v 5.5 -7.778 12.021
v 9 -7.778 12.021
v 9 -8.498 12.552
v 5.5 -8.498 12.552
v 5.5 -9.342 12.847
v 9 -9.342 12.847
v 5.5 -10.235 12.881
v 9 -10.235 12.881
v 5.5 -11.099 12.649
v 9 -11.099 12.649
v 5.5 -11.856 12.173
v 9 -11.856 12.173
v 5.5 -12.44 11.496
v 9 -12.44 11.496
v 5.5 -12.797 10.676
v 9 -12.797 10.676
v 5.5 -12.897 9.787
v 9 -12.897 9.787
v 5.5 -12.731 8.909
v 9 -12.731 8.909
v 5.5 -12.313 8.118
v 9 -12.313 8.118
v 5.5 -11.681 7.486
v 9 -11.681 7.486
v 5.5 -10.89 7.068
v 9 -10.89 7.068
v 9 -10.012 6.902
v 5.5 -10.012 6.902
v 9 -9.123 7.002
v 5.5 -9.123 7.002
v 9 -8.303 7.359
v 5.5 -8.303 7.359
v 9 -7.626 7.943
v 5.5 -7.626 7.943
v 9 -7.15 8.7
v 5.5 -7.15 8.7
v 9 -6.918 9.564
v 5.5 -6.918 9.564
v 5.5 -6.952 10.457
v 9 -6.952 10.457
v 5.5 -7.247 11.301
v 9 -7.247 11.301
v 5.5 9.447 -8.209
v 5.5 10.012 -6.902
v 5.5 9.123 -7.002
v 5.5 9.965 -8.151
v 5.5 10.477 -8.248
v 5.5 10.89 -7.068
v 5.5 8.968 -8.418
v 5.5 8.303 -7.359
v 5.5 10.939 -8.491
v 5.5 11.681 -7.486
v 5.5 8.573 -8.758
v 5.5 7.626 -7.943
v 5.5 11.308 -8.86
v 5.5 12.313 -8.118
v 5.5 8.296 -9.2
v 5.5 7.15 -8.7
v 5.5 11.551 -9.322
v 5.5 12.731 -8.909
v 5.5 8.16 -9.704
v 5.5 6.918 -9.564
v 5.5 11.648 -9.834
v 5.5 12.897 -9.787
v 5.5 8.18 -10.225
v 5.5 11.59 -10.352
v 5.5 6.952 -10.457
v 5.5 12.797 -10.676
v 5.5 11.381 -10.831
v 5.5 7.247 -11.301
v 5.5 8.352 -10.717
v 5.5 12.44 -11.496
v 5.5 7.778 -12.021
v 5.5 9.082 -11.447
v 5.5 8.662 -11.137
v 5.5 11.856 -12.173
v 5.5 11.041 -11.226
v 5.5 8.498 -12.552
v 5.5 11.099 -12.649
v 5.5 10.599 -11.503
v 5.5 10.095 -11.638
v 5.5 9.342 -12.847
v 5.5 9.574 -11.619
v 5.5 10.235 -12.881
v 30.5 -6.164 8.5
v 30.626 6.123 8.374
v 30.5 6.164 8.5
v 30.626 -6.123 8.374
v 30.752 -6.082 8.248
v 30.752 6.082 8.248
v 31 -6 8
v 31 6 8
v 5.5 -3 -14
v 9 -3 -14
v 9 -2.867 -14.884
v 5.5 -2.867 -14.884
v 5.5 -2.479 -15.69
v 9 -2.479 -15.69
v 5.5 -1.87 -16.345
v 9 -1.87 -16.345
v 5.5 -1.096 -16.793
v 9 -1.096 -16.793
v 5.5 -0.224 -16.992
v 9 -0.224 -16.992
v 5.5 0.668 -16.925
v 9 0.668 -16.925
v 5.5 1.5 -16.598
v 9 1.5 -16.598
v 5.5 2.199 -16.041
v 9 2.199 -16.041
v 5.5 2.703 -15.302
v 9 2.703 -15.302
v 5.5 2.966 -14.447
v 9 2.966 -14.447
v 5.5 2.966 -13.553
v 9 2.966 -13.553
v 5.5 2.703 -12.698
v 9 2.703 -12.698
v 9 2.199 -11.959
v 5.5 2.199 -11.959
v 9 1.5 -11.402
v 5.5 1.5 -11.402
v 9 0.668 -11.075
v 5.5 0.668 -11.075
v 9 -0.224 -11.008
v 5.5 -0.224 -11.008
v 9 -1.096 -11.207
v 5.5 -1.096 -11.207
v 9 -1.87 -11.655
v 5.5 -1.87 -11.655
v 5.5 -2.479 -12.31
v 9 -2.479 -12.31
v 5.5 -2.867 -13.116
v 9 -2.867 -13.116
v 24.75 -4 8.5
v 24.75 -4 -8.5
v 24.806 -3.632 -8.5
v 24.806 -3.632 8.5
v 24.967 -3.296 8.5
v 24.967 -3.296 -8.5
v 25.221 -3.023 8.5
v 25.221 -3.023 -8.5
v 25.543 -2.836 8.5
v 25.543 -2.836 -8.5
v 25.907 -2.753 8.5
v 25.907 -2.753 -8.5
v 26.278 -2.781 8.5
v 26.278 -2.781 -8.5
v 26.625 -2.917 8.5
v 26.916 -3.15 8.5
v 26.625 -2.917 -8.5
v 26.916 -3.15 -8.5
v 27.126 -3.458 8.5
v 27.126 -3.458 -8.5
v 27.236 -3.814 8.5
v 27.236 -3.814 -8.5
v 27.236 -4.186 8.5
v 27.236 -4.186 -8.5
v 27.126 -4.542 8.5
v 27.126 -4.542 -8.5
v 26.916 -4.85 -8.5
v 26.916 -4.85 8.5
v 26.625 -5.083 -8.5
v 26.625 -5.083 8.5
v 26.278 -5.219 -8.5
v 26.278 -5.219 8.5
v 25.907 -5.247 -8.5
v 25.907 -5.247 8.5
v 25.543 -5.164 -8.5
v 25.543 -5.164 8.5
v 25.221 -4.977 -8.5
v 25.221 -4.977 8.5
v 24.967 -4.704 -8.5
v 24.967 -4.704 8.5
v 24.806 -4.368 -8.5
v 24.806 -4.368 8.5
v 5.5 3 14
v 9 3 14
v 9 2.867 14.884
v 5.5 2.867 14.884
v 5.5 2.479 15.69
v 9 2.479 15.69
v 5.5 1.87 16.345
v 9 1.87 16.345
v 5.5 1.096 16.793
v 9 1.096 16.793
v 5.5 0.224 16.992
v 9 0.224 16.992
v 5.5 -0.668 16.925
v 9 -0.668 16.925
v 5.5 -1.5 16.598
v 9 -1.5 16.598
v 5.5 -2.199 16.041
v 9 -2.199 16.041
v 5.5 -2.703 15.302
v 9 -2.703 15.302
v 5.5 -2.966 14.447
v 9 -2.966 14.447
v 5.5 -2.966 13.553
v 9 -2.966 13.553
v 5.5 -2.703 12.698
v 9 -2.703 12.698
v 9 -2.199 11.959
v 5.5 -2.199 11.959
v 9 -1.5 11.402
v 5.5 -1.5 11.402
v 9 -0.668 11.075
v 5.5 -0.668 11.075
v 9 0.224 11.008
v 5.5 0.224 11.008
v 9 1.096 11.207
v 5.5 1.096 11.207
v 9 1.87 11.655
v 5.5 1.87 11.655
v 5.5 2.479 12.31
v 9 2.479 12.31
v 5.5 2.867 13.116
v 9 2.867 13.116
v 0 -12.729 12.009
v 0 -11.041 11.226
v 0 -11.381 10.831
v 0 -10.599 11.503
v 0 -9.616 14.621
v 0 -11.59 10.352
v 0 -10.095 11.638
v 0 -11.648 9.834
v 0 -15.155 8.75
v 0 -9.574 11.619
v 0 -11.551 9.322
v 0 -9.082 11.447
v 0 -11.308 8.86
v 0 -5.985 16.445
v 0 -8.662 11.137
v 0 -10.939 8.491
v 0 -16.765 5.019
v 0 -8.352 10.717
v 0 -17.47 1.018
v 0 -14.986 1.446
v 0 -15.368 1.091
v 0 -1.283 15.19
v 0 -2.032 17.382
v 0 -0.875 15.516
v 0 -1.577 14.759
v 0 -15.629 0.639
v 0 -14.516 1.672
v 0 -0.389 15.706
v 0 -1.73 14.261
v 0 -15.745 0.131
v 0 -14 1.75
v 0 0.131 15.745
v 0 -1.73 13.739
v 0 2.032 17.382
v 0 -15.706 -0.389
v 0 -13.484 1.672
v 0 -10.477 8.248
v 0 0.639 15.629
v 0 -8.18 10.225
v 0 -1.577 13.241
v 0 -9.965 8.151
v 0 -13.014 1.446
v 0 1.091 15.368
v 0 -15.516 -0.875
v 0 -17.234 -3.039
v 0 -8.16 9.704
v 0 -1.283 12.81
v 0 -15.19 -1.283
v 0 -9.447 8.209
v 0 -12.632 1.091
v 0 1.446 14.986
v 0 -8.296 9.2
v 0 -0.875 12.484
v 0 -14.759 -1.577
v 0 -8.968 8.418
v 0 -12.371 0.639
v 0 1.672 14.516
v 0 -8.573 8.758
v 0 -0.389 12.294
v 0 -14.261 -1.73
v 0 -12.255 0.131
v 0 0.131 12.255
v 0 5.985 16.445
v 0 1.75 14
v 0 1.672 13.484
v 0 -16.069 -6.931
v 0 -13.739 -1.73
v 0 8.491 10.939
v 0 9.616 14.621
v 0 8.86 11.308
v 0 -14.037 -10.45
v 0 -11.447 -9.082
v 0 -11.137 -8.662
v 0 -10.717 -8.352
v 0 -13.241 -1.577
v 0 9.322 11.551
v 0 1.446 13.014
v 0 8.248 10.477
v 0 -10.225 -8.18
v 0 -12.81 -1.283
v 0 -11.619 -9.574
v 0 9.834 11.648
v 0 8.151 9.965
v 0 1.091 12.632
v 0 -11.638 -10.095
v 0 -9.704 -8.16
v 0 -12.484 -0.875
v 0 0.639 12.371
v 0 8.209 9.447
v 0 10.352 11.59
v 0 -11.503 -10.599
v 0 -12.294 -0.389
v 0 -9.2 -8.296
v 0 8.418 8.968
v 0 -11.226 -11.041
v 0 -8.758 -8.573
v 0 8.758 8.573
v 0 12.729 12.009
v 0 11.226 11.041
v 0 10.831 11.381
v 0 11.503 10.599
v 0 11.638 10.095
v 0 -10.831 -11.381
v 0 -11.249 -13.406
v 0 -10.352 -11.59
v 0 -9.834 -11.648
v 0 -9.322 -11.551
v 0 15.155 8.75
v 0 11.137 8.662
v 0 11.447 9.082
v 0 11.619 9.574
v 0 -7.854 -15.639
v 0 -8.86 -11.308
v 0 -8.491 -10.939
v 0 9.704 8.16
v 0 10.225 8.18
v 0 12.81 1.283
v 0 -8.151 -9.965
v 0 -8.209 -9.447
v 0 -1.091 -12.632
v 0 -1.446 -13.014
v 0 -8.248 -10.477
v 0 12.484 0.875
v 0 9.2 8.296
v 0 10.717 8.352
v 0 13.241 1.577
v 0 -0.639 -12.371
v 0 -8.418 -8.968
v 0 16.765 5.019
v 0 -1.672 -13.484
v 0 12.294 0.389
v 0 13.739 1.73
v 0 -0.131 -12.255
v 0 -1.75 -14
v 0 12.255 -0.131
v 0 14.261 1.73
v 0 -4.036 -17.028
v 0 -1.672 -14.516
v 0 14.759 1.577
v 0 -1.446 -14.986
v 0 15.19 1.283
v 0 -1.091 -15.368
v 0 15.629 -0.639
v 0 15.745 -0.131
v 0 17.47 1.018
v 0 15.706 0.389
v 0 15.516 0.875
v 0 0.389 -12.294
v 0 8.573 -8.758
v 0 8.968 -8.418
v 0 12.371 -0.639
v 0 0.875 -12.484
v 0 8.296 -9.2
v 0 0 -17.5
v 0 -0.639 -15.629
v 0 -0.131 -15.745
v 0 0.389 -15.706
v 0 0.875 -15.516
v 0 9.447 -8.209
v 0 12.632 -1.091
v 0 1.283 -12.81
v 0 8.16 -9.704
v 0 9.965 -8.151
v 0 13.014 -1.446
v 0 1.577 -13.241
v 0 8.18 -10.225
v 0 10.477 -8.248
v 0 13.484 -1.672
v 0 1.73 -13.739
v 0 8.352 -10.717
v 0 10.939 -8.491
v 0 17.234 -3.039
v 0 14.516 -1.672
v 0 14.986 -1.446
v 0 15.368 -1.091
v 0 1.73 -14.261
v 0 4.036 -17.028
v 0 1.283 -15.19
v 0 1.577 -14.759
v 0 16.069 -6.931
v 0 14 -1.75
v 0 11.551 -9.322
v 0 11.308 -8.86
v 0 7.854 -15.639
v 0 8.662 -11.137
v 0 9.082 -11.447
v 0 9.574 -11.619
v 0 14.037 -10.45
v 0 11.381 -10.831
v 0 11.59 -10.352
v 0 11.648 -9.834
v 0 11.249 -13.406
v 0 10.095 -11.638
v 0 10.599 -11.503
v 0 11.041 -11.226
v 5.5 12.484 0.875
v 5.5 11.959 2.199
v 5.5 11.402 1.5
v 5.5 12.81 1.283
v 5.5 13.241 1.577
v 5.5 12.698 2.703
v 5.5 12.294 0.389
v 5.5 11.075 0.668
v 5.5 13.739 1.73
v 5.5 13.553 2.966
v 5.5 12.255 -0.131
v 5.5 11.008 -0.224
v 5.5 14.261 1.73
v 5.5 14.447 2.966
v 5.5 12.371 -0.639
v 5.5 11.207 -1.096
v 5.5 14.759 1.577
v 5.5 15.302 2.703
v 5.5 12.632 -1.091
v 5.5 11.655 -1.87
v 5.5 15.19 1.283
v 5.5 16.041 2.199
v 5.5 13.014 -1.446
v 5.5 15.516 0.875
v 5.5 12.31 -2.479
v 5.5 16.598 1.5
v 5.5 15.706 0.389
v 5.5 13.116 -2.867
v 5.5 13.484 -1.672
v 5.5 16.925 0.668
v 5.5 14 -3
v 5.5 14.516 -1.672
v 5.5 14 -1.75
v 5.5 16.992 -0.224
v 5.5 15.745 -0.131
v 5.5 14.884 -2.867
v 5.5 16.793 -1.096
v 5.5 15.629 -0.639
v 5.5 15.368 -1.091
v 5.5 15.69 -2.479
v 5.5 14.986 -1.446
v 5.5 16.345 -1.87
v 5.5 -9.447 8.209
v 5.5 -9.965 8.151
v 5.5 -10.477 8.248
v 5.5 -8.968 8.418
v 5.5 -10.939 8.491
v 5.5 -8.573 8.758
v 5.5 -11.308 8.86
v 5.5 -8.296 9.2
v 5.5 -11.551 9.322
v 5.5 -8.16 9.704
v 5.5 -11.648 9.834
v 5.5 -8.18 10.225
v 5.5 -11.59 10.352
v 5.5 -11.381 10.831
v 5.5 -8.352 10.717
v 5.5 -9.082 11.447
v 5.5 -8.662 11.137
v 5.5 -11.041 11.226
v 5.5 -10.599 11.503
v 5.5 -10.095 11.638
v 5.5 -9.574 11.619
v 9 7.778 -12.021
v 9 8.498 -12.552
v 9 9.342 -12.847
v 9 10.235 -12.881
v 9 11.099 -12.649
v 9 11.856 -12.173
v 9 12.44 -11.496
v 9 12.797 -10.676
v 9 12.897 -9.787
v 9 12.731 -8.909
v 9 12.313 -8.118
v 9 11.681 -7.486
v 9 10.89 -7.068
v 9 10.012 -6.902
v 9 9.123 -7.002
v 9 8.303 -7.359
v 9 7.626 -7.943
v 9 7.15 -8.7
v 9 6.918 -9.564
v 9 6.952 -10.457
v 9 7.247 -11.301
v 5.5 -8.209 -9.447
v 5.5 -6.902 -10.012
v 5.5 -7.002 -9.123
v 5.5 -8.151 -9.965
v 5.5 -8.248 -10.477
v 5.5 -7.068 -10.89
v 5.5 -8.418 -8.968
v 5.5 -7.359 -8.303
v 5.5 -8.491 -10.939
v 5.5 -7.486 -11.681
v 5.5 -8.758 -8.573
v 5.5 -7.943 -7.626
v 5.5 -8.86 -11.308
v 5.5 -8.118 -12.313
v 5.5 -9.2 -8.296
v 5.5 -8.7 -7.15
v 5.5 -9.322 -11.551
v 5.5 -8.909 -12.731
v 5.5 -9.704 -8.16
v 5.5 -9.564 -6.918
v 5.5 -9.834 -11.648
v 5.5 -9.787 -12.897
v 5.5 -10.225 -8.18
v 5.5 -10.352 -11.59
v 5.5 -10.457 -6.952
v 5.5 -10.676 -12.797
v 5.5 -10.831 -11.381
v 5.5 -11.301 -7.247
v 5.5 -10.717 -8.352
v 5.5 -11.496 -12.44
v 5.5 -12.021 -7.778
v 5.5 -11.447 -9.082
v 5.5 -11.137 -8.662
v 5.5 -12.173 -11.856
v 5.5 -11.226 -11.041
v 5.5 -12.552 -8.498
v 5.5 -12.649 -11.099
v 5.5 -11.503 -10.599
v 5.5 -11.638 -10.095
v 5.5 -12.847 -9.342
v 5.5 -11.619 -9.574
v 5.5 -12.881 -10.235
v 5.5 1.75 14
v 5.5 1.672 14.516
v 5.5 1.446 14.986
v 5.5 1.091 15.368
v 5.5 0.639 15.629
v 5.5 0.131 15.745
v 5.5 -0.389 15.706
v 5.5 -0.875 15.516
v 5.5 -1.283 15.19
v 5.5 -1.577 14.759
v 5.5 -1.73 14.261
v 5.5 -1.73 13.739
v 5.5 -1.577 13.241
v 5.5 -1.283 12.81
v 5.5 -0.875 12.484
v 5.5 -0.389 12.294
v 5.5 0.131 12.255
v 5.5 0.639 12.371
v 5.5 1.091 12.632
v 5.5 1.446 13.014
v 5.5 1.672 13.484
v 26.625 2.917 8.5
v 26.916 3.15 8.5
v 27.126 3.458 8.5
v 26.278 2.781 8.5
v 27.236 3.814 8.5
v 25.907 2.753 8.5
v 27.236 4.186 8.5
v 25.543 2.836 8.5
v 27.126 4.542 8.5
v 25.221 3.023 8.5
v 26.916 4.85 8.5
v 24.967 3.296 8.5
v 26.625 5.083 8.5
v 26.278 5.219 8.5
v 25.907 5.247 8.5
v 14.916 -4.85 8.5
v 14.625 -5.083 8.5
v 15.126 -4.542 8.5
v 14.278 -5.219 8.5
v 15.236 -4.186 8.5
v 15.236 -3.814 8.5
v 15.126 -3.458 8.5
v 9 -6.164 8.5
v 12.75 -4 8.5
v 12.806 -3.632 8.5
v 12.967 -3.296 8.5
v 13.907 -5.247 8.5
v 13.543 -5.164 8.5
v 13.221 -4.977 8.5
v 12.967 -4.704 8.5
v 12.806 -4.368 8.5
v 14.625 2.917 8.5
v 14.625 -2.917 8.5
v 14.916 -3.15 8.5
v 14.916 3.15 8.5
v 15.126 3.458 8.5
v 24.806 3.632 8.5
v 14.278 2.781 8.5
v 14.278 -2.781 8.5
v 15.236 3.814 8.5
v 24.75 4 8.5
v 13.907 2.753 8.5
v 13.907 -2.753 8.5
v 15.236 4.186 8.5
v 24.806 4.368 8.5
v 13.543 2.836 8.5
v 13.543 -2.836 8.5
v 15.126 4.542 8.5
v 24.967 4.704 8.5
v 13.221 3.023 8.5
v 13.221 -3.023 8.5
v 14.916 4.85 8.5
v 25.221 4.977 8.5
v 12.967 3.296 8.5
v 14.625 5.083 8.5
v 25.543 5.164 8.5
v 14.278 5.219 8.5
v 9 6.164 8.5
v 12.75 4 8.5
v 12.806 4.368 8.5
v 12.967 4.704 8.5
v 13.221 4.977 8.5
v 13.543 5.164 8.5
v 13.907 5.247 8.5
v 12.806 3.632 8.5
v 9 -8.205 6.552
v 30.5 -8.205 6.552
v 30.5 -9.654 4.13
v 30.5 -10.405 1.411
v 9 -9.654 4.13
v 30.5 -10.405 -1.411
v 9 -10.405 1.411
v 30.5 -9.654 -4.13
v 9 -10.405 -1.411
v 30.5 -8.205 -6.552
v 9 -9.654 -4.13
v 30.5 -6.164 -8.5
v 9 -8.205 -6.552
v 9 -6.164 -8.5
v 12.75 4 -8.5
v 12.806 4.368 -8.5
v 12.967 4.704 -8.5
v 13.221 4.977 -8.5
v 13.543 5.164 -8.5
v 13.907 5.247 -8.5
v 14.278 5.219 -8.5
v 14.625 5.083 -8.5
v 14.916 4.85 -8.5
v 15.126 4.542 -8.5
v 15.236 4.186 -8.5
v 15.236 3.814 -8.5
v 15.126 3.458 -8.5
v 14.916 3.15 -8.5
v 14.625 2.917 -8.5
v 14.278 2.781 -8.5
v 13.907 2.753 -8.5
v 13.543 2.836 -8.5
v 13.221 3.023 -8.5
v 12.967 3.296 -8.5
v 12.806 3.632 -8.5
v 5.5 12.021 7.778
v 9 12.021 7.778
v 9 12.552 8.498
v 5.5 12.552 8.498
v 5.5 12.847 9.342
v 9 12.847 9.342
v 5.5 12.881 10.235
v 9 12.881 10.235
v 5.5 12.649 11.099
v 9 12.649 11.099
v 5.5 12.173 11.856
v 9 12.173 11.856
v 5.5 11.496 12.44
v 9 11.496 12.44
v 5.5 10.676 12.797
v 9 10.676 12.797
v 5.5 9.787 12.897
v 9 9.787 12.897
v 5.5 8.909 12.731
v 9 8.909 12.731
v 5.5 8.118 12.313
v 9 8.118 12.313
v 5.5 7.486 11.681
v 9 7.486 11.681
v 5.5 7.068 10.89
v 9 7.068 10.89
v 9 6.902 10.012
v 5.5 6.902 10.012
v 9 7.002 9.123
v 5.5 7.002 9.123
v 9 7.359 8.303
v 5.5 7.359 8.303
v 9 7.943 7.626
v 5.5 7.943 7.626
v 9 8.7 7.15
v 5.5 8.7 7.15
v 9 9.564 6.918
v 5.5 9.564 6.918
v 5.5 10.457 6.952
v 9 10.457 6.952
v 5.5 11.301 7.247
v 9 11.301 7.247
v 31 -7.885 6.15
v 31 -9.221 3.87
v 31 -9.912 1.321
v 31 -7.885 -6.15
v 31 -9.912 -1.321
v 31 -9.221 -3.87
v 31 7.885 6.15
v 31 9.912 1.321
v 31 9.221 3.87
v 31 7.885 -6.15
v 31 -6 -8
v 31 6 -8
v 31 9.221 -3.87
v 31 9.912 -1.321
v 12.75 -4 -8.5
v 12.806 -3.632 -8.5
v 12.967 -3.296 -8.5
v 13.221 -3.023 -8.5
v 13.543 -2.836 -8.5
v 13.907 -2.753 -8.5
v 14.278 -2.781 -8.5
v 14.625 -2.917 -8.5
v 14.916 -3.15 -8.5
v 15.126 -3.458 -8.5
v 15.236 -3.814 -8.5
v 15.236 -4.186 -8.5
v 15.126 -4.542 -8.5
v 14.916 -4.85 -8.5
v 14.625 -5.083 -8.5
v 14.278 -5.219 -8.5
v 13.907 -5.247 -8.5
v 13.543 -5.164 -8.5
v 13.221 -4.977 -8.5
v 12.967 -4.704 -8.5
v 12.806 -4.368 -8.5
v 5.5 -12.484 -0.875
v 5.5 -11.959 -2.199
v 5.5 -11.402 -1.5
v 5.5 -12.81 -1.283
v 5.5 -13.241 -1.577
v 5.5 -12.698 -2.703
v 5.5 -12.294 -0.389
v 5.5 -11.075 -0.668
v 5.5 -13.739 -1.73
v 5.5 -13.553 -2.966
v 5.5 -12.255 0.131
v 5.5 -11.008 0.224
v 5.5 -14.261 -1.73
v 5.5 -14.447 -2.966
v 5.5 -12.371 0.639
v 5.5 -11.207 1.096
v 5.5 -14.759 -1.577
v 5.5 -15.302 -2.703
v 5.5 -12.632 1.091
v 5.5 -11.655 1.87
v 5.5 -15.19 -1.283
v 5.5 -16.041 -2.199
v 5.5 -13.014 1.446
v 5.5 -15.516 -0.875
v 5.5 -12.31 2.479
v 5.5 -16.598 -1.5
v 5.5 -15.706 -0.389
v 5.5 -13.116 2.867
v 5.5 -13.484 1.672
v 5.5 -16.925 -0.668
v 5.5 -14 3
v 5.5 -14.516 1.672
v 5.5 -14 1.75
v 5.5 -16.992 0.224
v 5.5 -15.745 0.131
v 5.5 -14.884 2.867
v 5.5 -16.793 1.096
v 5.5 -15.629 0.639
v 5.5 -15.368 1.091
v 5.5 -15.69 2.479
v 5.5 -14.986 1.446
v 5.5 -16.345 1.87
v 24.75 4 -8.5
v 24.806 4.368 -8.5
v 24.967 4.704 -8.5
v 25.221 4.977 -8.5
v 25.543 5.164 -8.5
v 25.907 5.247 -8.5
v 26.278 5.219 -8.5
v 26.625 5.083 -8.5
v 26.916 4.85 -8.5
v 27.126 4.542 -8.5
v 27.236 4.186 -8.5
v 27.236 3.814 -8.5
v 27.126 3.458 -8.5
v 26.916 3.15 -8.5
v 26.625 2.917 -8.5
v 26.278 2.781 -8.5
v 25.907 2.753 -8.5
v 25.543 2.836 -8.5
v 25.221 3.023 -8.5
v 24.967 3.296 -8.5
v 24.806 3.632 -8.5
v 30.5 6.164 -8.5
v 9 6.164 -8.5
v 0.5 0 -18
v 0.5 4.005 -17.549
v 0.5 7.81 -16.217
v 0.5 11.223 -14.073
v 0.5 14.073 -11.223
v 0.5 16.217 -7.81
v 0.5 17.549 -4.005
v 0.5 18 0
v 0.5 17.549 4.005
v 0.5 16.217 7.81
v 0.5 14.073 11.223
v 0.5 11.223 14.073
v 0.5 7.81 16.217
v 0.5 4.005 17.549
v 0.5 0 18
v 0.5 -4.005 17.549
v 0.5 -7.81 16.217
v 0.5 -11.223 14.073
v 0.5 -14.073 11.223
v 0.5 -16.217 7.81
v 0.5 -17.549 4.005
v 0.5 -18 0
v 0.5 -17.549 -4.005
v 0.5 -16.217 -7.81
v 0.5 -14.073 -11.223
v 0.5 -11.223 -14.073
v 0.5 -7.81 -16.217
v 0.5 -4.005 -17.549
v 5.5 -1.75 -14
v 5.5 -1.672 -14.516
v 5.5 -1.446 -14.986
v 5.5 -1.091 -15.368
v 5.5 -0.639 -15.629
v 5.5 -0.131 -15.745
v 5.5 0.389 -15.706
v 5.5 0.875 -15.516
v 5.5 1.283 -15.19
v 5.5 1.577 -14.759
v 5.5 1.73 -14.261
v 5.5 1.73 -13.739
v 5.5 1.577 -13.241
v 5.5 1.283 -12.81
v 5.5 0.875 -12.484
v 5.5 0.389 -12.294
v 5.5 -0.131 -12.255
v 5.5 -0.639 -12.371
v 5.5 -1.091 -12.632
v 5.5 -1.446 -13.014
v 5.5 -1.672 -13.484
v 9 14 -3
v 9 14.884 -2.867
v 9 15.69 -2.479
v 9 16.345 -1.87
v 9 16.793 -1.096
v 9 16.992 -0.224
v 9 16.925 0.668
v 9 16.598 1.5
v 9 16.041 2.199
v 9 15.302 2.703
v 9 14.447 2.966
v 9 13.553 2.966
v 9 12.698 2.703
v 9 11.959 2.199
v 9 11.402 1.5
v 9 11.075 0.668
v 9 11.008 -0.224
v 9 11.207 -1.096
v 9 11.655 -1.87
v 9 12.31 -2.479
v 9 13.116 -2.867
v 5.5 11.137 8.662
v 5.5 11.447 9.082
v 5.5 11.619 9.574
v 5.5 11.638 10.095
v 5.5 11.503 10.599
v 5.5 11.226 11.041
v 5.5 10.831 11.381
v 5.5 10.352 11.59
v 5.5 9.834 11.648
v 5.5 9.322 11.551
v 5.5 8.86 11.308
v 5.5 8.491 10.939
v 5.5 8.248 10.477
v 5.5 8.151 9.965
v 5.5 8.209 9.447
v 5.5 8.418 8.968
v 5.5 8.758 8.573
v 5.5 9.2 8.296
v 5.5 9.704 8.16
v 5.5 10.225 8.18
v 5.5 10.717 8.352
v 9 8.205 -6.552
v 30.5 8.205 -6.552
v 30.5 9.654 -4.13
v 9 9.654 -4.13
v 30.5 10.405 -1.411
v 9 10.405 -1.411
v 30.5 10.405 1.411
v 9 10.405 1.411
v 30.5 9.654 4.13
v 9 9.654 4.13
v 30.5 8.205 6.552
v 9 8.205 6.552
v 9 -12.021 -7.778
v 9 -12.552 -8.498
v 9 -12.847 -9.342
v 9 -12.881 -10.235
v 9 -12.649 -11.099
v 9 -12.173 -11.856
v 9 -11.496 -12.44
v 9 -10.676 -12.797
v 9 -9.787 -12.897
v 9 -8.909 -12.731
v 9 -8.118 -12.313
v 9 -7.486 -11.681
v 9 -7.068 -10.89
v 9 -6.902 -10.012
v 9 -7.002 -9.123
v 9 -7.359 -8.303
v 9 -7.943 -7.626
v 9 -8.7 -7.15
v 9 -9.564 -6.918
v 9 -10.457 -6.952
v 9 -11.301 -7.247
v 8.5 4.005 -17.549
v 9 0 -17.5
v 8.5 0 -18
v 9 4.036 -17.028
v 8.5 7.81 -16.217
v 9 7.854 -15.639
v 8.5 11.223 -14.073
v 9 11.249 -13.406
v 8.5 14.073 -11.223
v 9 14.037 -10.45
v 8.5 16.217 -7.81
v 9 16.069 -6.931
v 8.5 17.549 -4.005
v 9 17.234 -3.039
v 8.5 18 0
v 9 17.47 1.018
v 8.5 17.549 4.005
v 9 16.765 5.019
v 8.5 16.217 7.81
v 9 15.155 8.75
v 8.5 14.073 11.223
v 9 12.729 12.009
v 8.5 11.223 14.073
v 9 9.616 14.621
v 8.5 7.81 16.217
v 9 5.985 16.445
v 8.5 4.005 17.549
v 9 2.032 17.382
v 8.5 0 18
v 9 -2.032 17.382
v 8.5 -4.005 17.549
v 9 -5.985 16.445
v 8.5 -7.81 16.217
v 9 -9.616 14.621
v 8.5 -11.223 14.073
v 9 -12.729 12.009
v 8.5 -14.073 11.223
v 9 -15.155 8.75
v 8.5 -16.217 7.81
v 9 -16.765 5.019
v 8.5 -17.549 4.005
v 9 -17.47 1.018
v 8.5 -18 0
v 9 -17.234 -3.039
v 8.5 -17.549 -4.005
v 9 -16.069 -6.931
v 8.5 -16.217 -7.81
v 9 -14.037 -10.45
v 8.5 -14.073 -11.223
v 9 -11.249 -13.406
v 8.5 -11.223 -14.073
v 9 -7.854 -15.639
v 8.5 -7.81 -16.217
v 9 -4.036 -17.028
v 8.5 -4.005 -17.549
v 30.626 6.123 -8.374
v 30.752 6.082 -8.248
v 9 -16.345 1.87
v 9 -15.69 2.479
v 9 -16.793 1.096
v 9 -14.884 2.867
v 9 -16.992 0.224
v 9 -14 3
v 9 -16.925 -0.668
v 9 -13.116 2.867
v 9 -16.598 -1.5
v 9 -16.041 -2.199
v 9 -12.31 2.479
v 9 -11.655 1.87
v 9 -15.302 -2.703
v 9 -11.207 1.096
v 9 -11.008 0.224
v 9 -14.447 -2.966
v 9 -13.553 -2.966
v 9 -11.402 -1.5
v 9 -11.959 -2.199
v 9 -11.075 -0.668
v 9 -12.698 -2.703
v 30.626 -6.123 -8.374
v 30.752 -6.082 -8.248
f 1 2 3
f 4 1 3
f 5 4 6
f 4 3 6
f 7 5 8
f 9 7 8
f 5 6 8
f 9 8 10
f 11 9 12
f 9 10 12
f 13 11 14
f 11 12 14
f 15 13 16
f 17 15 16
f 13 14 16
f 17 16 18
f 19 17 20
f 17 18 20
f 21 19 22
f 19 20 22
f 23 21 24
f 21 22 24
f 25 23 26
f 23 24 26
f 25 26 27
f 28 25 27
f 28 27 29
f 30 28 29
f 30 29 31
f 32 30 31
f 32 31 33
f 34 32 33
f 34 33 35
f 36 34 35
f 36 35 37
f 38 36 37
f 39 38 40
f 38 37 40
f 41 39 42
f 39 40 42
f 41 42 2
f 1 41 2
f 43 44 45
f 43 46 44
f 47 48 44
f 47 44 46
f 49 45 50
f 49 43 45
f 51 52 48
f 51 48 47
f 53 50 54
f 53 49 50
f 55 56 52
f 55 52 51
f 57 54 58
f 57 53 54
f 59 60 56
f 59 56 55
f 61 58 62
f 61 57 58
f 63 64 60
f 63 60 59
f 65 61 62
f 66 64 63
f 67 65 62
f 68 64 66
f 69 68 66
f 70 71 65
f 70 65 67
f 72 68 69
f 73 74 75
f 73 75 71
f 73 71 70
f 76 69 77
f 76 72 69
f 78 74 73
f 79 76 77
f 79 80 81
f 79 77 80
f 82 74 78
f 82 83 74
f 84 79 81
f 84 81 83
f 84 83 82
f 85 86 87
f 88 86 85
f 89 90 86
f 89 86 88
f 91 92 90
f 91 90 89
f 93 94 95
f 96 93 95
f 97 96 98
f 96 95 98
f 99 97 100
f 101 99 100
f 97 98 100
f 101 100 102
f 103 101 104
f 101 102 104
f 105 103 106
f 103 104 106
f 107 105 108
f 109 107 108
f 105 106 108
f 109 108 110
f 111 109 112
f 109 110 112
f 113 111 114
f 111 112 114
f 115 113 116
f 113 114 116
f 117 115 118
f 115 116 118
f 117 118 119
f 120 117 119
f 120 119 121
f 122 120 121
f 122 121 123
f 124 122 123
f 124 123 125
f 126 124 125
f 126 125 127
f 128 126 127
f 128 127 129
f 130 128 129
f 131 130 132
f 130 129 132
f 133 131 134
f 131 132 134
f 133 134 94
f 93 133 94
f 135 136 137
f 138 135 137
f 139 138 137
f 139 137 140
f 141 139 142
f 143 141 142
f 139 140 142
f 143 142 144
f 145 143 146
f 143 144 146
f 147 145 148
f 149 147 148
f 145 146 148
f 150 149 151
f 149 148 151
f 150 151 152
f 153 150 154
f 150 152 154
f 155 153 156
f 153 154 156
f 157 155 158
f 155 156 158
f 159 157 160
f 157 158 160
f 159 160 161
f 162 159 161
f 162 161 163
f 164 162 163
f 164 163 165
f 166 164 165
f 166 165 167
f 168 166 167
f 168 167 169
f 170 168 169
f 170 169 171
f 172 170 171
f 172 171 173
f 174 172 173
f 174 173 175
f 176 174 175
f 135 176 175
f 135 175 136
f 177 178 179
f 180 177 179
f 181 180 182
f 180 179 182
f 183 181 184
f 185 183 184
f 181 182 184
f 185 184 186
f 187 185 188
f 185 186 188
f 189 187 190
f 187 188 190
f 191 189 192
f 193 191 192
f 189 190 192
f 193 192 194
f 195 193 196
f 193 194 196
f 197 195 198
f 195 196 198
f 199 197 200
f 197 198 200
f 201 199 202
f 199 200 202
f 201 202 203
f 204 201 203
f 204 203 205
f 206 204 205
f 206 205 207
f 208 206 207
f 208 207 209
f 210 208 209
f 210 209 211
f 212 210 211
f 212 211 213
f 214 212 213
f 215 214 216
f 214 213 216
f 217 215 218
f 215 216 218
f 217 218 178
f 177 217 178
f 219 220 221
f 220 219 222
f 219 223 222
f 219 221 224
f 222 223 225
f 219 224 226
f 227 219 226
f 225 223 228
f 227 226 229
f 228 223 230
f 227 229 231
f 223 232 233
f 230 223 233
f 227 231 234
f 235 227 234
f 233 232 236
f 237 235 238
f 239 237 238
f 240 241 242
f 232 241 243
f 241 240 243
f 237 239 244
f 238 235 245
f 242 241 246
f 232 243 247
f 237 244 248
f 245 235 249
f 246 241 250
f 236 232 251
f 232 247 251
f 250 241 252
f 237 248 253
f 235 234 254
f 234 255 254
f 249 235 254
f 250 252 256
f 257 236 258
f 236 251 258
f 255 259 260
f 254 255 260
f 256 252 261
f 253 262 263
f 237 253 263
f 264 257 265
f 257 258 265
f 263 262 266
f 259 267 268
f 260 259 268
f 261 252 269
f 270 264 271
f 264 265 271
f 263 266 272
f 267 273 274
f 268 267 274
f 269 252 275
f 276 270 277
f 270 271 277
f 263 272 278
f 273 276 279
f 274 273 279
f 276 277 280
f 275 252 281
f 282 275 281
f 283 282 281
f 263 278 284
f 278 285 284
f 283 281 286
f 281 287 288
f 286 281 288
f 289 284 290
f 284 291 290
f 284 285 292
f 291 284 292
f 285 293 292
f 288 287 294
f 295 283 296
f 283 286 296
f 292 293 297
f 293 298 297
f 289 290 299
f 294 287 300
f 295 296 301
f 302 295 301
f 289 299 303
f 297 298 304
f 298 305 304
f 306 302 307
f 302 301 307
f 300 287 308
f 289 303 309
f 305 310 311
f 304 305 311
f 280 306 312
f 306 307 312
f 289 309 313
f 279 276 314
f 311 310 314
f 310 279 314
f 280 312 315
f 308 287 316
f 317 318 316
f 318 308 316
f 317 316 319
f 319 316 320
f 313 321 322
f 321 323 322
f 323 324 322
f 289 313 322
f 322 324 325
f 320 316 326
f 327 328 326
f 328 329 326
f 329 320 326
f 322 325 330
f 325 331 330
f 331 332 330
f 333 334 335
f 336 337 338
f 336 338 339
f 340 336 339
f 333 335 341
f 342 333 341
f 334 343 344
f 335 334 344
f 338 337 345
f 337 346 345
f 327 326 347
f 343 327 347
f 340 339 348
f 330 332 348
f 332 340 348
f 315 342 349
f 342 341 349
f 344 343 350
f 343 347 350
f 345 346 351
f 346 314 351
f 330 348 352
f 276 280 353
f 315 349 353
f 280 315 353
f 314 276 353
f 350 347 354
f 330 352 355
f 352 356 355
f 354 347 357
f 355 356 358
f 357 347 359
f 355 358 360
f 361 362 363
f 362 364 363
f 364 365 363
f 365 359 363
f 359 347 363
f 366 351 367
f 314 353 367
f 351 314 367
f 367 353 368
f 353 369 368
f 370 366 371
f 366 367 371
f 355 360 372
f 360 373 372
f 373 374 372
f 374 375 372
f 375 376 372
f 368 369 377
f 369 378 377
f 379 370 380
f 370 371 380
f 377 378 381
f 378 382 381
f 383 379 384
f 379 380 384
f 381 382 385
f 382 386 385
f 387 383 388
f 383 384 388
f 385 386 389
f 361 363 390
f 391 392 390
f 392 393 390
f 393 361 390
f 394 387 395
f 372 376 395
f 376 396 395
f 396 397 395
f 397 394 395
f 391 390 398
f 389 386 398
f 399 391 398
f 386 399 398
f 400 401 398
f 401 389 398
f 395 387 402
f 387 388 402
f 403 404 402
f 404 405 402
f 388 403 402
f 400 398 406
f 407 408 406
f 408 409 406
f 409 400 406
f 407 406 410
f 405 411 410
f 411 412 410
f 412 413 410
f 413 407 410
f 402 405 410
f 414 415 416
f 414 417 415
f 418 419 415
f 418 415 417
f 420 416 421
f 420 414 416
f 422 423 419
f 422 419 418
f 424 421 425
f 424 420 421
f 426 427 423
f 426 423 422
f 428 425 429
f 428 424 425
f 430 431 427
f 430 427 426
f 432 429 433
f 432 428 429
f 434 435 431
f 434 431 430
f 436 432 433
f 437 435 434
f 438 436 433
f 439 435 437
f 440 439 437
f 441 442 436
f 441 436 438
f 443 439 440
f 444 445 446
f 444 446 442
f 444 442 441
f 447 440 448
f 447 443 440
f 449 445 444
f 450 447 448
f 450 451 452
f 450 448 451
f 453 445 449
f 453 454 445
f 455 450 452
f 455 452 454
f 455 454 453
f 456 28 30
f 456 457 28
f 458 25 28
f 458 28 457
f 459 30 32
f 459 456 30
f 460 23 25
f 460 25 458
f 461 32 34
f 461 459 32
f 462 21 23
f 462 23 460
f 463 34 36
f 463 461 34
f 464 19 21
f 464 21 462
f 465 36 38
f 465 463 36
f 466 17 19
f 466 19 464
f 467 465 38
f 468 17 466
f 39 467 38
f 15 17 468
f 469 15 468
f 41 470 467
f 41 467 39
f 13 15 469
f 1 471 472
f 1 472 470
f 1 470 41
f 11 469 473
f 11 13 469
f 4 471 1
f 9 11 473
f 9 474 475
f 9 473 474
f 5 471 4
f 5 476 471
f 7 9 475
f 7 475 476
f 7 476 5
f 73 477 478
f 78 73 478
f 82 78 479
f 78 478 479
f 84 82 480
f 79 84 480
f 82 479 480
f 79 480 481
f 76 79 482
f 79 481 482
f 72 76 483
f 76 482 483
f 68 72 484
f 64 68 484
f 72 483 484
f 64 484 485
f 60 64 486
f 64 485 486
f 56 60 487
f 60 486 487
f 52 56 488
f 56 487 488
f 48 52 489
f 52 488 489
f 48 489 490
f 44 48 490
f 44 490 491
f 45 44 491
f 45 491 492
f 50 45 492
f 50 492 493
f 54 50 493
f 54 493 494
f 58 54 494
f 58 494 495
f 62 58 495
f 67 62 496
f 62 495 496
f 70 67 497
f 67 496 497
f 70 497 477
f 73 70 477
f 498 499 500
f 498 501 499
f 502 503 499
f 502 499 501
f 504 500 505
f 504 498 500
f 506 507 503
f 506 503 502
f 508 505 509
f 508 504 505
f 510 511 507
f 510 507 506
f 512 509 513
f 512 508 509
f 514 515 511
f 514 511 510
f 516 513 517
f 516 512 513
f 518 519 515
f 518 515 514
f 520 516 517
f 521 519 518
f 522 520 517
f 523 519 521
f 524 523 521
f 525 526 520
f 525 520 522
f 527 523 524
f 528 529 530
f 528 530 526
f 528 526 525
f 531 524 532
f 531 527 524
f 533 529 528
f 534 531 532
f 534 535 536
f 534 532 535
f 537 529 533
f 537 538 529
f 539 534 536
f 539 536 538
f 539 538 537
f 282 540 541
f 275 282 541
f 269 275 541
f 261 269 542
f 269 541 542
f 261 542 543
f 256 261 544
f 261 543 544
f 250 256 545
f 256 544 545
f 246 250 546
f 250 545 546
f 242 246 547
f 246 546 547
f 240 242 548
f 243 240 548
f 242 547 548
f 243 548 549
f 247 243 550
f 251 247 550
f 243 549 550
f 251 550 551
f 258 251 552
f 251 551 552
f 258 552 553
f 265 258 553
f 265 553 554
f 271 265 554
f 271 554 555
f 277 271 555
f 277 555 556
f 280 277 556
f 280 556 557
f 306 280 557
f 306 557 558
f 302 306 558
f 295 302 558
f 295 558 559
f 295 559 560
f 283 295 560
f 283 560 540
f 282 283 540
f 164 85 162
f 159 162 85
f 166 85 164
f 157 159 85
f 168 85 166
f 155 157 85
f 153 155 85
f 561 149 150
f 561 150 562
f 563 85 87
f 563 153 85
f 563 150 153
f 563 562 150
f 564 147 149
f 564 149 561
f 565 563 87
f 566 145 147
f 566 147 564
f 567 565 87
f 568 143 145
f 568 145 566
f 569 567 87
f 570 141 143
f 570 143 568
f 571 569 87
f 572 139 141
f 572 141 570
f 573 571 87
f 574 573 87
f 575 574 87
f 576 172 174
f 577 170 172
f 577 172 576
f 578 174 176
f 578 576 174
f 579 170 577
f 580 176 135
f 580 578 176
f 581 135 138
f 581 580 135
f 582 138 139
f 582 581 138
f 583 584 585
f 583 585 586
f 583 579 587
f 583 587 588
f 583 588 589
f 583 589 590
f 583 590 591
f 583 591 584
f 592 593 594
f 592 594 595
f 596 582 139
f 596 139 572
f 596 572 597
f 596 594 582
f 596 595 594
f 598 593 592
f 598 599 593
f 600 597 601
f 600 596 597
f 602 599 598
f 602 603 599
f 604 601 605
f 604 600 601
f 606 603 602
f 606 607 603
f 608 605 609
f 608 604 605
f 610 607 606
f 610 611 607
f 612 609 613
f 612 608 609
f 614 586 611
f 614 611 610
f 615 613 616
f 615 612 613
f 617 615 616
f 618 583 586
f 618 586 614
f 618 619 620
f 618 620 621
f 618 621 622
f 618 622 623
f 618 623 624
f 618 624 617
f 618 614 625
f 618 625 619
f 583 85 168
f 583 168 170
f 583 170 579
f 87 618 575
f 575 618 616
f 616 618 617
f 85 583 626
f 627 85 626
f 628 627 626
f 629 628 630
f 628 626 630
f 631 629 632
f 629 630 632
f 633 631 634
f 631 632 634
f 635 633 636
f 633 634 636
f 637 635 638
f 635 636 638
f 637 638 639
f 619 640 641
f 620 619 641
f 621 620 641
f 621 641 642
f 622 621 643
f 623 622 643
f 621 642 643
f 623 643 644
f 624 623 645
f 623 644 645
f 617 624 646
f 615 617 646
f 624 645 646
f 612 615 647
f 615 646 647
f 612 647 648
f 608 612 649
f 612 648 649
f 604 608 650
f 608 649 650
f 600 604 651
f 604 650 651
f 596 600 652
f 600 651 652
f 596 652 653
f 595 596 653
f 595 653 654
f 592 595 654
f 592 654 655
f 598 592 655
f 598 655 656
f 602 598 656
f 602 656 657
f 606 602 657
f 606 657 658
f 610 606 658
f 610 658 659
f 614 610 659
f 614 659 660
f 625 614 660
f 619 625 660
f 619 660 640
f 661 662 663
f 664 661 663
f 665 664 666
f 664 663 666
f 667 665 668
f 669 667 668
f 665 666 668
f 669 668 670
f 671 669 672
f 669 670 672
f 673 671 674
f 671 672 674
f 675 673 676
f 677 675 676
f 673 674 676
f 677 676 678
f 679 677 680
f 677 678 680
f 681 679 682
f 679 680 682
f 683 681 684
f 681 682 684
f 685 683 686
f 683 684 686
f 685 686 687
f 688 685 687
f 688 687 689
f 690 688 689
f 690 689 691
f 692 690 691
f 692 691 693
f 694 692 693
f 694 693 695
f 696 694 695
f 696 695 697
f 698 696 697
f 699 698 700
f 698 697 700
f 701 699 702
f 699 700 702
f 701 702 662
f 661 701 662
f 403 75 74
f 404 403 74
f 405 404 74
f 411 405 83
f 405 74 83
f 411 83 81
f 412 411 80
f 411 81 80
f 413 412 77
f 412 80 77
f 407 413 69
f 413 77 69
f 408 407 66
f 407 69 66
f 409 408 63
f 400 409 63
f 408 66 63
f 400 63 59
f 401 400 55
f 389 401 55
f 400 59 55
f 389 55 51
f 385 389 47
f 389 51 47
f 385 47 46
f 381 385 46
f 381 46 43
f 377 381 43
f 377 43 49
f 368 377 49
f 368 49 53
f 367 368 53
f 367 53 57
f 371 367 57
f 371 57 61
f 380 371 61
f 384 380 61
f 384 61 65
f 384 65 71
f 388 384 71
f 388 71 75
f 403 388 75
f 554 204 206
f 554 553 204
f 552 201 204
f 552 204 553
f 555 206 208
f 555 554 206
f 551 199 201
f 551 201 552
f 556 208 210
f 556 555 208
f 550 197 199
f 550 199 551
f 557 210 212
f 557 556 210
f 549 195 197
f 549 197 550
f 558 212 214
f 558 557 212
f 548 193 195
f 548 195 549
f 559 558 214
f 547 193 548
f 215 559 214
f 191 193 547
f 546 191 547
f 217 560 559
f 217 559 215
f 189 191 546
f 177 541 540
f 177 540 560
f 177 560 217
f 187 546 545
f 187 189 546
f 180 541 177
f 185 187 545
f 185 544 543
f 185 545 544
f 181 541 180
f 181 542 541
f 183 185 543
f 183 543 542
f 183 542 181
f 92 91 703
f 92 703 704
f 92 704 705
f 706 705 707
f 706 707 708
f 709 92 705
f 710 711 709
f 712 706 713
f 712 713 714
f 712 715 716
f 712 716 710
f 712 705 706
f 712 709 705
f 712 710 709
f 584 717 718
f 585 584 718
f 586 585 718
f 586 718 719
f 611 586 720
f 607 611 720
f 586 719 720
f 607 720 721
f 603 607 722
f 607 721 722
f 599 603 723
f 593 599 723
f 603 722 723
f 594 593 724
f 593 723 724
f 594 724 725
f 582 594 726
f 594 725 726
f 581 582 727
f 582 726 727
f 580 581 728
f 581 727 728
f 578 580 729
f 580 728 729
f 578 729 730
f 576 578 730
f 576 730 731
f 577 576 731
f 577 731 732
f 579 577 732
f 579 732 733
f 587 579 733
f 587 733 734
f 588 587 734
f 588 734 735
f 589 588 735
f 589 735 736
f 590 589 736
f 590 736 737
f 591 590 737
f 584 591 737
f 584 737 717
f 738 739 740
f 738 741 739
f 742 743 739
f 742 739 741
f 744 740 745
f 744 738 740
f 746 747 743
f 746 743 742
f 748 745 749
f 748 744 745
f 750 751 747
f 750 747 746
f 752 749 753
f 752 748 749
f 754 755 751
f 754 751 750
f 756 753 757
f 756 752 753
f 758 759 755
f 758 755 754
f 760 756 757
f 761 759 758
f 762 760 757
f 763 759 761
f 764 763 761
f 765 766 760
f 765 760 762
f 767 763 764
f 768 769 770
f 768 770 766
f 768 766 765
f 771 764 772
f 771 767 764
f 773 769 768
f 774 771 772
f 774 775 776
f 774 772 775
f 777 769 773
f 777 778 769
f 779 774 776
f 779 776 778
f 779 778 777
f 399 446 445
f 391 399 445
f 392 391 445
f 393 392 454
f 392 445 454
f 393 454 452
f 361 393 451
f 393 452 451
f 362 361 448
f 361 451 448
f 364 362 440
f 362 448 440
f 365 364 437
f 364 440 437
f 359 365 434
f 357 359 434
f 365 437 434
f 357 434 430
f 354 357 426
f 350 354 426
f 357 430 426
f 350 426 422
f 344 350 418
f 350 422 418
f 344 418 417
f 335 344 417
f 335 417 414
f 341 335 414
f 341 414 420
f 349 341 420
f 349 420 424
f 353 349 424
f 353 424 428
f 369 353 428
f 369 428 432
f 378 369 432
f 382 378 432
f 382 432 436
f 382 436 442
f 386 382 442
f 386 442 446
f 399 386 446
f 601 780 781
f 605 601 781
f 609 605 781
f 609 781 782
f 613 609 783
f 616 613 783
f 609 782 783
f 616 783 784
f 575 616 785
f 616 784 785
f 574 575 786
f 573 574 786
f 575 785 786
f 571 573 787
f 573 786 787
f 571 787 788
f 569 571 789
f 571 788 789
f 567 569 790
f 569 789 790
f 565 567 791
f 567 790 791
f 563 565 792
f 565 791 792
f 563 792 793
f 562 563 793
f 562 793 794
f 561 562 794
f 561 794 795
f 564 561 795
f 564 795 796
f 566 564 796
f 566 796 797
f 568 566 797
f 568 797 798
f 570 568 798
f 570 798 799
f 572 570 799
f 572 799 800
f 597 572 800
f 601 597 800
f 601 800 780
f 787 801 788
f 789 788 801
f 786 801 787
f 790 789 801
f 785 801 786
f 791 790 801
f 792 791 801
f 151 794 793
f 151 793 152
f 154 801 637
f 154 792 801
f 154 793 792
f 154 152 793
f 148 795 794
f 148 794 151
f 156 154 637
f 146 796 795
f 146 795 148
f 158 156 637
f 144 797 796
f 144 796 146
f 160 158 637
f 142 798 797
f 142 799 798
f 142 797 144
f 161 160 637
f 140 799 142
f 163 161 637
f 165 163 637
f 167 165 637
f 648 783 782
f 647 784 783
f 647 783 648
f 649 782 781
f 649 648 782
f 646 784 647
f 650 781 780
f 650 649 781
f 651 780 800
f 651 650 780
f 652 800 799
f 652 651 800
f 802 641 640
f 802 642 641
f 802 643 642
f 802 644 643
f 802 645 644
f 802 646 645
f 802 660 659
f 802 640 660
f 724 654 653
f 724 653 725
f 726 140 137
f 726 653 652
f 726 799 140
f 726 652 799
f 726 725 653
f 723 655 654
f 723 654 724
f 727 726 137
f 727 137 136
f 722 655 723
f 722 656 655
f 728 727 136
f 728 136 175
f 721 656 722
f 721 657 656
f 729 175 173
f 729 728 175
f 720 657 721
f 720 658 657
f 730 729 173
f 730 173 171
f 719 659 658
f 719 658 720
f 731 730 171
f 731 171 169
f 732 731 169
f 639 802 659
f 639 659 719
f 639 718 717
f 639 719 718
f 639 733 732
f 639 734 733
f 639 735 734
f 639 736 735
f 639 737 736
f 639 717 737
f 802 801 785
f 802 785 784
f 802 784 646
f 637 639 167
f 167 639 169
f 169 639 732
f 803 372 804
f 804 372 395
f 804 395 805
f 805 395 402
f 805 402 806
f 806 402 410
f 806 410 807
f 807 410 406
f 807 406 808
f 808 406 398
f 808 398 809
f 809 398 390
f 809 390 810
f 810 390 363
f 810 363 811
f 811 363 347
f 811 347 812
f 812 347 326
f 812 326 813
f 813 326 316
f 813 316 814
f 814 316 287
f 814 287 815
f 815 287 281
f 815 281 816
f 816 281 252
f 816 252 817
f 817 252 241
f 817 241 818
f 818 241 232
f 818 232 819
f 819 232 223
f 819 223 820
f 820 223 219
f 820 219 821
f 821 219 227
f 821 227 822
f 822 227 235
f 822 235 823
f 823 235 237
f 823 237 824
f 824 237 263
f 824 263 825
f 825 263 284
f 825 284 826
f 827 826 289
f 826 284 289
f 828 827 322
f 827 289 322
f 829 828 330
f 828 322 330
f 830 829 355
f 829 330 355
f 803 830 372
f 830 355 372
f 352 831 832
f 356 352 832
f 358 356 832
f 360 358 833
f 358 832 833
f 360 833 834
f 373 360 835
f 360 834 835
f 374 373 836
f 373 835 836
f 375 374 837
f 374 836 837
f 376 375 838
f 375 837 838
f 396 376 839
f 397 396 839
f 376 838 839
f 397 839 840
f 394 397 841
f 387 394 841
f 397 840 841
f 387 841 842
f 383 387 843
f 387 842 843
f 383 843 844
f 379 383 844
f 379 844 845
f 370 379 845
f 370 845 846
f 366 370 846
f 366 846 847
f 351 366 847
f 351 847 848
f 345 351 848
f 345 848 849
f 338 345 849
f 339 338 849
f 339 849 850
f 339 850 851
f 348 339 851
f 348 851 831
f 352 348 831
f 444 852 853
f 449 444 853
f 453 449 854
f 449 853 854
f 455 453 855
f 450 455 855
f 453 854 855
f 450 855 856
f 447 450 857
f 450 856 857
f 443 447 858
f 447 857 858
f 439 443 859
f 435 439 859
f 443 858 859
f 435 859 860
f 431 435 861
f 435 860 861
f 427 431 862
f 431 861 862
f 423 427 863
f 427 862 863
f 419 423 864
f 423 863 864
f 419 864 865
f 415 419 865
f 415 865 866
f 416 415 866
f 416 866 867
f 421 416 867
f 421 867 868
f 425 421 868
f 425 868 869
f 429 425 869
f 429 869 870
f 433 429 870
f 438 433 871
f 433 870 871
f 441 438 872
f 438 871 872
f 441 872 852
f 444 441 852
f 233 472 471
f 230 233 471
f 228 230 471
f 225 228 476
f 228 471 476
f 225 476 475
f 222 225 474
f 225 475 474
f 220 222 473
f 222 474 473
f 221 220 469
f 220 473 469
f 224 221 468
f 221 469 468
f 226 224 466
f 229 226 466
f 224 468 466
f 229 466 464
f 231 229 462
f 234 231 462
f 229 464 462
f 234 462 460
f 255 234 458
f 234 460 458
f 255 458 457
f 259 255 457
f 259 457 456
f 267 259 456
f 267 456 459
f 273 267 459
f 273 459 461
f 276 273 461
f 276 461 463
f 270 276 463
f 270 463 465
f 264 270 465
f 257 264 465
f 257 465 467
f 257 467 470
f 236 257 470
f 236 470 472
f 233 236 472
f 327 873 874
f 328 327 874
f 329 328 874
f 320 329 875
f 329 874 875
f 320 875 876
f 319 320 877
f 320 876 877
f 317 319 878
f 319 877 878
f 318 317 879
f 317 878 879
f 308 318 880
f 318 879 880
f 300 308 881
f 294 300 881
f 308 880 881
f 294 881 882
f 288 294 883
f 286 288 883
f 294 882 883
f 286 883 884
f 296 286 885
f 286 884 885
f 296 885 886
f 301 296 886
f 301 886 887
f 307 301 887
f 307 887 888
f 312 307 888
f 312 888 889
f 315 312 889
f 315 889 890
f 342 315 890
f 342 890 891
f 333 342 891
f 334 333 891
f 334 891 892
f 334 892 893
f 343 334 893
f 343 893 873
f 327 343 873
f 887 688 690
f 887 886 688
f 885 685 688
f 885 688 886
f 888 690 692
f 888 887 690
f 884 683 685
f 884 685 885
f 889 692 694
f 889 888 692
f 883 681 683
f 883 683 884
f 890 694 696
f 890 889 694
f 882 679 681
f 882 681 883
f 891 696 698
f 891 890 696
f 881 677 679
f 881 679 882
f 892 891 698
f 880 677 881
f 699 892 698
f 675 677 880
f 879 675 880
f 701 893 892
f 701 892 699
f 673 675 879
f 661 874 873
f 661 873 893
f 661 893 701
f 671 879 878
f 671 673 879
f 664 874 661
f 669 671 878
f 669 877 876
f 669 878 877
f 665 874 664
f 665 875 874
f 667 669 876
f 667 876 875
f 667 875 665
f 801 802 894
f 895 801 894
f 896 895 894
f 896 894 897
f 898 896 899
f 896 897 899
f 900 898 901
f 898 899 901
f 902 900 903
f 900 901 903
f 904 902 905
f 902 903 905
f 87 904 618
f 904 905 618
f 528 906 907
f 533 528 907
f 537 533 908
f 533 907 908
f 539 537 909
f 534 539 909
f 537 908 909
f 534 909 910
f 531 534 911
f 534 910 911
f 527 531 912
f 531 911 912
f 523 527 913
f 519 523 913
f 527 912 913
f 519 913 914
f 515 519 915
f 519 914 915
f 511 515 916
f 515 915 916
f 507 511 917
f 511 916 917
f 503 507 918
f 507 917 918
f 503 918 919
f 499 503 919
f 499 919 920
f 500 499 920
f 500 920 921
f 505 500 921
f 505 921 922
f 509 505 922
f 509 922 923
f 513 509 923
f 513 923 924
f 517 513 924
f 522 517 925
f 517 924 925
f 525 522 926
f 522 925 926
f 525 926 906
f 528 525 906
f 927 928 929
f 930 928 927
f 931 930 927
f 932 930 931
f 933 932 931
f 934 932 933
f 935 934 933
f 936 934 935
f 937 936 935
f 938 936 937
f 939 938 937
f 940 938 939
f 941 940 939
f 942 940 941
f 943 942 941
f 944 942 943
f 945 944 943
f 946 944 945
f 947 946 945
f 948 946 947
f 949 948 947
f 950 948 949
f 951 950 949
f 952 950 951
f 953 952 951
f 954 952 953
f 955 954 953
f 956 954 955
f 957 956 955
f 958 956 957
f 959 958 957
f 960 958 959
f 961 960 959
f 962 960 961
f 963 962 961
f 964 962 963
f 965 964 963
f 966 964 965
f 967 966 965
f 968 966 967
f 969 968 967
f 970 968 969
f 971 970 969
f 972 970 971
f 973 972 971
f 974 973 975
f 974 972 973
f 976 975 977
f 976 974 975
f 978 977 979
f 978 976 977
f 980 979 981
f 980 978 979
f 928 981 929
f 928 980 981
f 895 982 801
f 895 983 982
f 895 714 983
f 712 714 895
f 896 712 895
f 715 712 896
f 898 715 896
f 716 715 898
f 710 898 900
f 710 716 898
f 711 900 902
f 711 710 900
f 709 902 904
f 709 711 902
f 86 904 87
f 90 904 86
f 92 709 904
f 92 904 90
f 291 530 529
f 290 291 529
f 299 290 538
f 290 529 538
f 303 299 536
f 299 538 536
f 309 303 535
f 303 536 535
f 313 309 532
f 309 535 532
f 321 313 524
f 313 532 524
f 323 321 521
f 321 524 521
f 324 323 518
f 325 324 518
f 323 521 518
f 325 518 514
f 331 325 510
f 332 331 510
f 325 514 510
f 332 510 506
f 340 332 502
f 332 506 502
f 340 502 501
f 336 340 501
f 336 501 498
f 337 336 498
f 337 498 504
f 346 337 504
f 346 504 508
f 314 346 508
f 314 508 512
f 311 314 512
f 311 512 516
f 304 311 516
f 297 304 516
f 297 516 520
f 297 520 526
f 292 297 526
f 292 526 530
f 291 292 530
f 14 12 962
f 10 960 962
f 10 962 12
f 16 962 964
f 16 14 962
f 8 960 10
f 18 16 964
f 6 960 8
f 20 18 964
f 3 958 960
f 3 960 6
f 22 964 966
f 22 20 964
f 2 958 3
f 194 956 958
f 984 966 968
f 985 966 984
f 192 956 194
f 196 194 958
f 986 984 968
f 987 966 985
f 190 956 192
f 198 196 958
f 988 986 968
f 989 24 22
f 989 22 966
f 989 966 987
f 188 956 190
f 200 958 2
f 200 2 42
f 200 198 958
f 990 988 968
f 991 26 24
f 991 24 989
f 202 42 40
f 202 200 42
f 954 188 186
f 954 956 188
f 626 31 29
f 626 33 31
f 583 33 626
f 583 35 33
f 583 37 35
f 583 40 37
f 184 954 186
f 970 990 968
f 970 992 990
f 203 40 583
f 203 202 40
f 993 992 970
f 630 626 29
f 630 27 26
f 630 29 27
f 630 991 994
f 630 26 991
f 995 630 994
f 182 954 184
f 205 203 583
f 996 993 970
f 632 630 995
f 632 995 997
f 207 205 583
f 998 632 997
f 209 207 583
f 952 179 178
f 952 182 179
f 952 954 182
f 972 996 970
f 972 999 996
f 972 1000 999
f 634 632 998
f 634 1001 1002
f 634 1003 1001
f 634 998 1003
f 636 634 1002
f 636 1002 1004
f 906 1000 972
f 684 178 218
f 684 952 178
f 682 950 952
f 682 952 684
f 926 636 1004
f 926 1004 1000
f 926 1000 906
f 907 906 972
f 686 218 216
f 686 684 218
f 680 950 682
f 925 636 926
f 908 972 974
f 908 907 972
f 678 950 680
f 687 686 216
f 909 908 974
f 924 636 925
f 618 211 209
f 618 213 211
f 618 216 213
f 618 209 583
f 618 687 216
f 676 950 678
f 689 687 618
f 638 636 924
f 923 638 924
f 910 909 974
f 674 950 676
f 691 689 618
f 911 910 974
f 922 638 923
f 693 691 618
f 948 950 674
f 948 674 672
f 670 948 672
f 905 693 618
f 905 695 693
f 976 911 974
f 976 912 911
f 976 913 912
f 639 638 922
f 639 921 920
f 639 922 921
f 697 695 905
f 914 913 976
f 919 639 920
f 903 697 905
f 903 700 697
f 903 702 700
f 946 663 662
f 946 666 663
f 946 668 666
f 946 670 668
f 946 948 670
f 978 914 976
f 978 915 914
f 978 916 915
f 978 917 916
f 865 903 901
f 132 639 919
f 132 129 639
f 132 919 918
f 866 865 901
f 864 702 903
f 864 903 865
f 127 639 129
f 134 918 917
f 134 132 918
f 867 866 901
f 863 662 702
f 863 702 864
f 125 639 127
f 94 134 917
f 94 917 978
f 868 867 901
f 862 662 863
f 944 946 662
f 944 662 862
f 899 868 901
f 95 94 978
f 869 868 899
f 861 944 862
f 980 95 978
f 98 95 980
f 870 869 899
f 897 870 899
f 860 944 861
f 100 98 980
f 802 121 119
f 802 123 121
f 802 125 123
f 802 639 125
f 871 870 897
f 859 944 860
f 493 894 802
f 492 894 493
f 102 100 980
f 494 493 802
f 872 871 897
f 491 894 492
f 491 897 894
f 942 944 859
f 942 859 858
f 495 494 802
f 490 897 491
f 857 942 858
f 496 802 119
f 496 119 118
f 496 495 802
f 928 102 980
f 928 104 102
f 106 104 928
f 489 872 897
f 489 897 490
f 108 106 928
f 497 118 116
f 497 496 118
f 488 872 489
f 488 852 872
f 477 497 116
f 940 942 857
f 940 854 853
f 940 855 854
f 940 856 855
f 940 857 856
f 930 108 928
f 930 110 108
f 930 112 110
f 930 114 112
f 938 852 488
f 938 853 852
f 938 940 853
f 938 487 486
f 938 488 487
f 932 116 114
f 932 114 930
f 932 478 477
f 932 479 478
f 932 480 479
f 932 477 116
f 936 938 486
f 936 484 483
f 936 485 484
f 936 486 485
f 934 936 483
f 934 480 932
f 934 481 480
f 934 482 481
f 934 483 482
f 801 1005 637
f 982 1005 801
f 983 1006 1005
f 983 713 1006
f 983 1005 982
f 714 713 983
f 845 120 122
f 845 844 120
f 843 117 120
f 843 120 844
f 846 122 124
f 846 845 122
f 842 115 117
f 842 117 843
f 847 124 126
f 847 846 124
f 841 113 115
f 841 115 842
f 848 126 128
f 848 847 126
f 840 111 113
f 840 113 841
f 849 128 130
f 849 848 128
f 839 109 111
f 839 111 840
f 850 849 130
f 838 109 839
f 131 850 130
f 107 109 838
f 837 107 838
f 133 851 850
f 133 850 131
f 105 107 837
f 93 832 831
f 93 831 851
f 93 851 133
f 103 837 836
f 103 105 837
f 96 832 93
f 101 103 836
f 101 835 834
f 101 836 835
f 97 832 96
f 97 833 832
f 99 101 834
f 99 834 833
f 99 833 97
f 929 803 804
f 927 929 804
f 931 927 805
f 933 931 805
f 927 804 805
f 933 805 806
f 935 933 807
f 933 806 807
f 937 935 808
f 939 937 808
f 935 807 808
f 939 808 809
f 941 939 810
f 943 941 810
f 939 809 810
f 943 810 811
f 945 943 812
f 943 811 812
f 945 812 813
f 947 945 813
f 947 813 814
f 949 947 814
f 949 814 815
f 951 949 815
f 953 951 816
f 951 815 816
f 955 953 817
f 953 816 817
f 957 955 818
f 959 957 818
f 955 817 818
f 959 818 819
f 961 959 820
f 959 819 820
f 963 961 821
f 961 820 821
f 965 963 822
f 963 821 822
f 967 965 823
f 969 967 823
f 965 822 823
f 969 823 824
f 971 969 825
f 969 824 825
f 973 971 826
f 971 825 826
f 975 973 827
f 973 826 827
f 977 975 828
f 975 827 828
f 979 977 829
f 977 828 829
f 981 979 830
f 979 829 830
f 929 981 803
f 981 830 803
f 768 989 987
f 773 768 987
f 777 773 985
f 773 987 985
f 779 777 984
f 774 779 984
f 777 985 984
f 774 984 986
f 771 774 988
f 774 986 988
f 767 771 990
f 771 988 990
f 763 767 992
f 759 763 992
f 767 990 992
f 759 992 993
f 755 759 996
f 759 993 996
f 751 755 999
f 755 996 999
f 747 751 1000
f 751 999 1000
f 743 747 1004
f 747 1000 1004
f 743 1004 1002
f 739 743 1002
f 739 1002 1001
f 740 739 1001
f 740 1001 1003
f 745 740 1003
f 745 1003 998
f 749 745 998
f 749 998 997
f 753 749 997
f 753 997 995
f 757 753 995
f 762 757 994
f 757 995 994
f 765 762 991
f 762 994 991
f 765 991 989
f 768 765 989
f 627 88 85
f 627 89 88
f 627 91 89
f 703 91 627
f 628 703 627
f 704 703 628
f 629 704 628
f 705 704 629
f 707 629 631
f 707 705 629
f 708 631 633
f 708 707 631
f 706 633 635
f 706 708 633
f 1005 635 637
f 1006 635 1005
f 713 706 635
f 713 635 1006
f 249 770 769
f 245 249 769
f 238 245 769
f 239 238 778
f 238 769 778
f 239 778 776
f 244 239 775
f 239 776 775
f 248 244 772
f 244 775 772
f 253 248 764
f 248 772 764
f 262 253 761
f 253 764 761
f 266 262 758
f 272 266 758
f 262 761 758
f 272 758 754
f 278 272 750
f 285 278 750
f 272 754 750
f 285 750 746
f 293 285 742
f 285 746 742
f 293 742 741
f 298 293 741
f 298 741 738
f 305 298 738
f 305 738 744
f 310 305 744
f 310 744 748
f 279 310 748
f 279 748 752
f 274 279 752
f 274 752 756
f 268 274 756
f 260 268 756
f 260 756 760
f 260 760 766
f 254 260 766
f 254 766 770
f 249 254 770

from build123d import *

# Parameters (mm, degrees)
SKETCH1_R           = 18
BOSS_EXTRUDE1_DEPTH = 9
SKETCH2_R           = 10.5
BOSS_EXTRUDE2_DEPTH = 22
SKETCH3_R           = 1.75
CUT_EXTRUDE2_DEPTH  = 34.645207683
SKETCH3_3_R         = 3
SKETCH3_3_R_2       = 1.75
CUT_EXTRUDE3_DEPTH  = 3.5
CIRPATTERN1_COUNT   = 8
CHAMFER1_SIZE       = 0.5
CUT_EXTRUDE4_DEPTH  = 34.645207683
M3_TAPPED_HOLE1_D   = 2.5
CHAMFER2_SIZE       = 0.5


with BuildPart() as part:
    # Sketch1 → Boss-Extrude1 (new body)
    with BuildSketch(Plane(origin=(0, 0, 0), x_dir=(0, 0, -1), z_dir=(1, 0, 0))):
        Circle(SKETCH1_R)
    extrude(amount=BOSS_EXTRUDE1_DEPTH)

    # Sketch2 → Boss-Extrude2 (add)
    with BuildSketch(Plane(origin=(9, 0, 0), x_dir=(0, 0, -1), z_dir=(1, 0, 0))):
        Circle(SKETCH2_R)
    extrude(amount=BOSS_EXTRUDE2_DEPTH)

    # Sketch3 → Cut-Extrude2 (cut, through all)
    with BuildSketch(Plane(origin=(9, 0, 0), x_dir=(0, 0, -1), z_dir=(1, 0, 0))):
        with Locations((0, 14)):
            Circle(SKETCH3_R)
    cut_extrude2 = extrude(amount=-CUT_EXTRUDE2_DEPTH, mode=Mode.SUBTRACT)

    # Sketch3<3> → Cut-Extrude3 (cut)
    with BuildSketch(Plane(origin=(9, 0, 0), x_dir=(0, 0, -1), z_dir=(1, 0, 0))):
        with Locations((0, 14)):
            Circle(SKETCH3_3_R)
        with Locations((0, 14)):
            Circle(SKETCH3_3_R_2, mode=Mode.SUBTRACT)
    cut_extrude3 = extrude(amount=-CUT_EXTRUDE3_DEPTH, mode=Mode.SUBTRACT)

    # CirPattern1: Cut-Extrude2, Cut-Extrude3 ×8 about axis
    cirpattern1_axis = Axis((31, 0, 0), (-1, 0, 0))
    add([cut_extrude2.rotate(cirpattern1_axis, i * 360 / CIRPATTERN1_COUNT) for i in range(1, CIRPATTERN1_COUNT)], mode=Mode.SUBTRACT)
    add([cut_extrude3.rotate(cirpattern1_axis, i * 360 / CIRPATTERN1_COUNT) for i in range(1, CIRPATTERN1_COUNT)], mode=Mode.SUBTRACT)

    # Chamfer1
    chamfer1_edges = [part.edges().sort_by_distance(p)[0] for p in [
        (9, 0, 18),
        (0, 0, 18),
    ]]
    chamfer(chamfer1_edges, length=CHAMFER1_SIZE)

    # Sketch4 → Cut-Extrude4 (cut, through all)
    with BuildSketch(Plane(origin=(9, 0, 0), x_dir=(0, 0, -1), z_dir=(1, 0, 0))):
        with BuildLine():
            Line((-8.5, -6.164414003), (-8.5, 6.164414003))
            ThreePointArc((-8.5, 6.164414003), (-10.5, 0), (-8.5, -6.164414003))
        make_face()
        with BuildLine():
            ThreePointArc((8.5, -6.164414003), (10.5, 0), (8.5, 6.164414003))
            Line((8.5, 6.164414003), (8.5, -6.164414003))
        make_face()
    extrude(amount=CUT_EXTRUDE4_DEPTH, mode=Mode.SUBTRACT)

    # M3 Tapped Hole1 (through all)
    with Locations(Plane(origin=(14, 4, 8.5), x_dir=(1, 0, 0), z_dir=(0, 0, 1))):
        with Locations((0, 0), (12, 0), (0, -8), (12, -8)):
            Hole(M3_TAPPED_HOLE1_D / 2)

    # Chamfer2
    chamfer2_edges = [part.edges().sort_by_distance(p)[0] for p in [
        (31, 0, -8.5),
        (31, -10.5, 0),
        (31, 0, 8.5),
        (31, 10.5, 0),
    ]]
    chamfer(chamfer2_edges, length=CHAMFER2_SIZE)


solid = part.part
